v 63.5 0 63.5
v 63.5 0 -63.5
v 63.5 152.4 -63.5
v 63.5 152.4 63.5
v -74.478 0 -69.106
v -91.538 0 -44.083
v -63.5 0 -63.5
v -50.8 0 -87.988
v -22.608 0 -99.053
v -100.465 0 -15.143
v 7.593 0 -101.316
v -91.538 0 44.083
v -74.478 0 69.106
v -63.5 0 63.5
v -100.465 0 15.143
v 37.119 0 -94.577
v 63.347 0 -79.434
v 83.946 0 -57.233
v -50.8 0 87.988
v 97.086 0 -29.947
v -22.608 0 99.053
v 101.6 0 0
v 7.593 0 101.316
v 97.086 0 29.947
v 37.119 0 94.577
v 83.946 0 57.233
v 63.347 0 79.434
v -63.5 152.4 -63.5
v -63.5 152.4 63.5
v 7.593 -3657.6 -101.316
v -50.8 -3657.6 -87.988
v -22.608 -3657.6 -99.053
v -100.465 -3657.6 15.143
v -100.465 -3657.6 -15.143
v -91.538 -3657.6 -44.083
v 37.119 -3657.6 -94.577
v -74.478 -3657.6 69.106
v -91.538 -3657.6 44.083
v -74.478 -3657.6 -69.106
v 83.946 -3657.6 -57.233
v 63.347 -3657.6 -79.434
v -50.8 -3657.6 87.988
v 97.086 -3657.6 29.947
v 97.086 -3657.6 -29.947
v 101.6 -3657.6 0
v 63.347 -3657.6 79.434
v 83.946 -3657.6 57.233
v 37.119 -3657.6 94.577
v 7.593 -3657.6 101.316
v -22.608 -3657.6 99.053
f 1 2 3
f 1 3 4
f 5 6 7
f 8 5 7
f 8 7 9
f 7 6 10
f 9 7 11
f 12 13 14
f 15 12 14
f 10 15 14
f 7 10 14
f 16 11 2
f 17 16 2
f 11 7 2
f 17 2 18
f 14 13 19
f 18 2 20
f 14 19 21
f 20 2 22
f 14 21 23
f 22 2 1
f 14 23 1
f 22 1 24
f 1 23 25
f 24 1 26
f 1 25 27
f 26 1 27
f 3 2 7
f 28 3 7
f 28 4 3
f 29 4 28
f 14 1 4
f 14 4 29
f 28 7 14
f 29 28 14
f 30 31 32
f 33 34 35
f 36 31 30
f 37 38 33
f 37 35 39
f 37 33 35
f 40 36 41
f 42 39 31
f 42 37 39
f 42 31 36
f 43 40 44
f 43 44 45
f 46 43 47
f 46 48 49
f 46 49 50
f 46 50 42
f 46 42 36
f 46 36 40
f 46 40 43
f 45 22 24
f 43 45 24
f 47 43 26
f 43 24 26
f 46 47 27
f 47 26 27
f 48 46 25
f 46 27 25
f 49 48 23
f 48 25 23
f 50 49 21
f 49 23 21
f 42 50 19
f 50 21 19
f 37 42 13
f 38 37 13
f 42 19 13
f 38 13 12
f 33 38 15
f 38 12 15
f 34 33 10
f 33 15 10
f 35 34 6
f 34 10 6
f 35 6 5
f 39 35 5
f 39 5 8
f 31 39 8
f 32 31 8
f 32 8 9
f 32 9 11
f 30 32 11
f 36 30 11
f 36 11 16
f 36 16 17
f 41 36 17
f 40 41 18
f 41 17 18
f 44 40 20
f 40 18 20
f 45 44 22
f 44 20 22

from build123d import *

# Parameters (mm, degrees)
F0_R     = 101.6
F1_DEPTH = 3657.6
F2_W     = 127
F2_H     = 127
F3_DEPTH = 152.4


with BuildPart() as f1:
    # F0 (on Front) → F1 (new body)
    with BuildSketch(Plane.XZ):
        Circle(F0_R)
    extrude(amount=F1_DEPTH)

    # F2 (on face) → F3 (join)
    with BuildSketch(Plane(origin=(0, 0, 0), x_dir=(-1, 0, 0), z_dir=(0, 1, 0))):
        Rectangle(F2_W, F2_H)
    extrude(amount=F3_DEPTH)


solid = f1.part
